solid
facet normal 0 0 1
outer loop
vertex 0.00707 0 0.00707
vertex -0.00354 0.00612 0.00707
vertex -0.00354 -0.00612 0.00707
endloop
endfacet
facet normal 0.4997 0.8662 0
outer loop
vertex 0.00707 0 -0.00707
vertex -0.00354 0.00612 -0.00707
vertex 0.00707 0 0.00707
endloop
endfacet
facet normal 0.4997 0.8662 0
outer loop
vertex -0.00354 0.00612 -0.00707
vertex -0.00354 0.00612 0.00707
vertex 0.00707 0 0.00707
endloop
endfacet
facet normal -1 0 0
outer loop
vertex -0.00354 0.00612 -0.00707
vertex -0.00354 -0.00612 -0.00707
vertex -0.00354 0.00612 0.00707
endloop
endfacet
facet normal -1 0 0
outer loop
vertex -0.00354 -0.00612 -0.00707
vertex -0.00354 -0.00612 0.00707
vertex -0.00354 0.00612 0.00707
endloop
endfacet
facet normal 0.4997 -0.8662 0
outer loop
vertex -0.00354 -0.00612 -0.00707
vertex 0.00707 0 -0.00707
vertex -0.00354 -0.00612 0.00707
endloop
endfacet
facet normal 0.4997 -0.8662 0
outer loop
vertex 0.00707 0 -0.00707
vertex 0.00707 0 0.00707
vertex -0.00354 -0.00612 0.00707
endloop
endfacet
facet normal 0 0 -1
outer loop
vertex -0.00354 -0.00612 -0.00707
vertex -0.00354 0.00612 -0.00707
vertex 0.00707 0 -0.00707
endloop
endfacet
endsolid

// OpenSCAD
include <params.scad>
assert(body_l > 0 && body_w > 0, "positive plate dims");
assert(ext_left <= clear_left, "left extent within door clearance");
assert(ext_down <= clear_down, "down extent within handle clearance");
assert(knob_w_top <= knob_w_base, "knob tapers base->top");
assert(knob_engage < knob_h, "engagement shallower than protrusion");
// 基板レイアウト
assert(pcb_off_y - pcb_w/2 >= ped_curb_ro + 1, "基板 -Y 端が受けカーブに近すぎる");
assert(abs(pcb_top_z - (wall + tray_t + pcb_standoff_h + pcb_t)) < 1e-6,
       "基板上面の Z が積み上げと一致");
echo("params_test ok");
sphere(0.01, $fn = 3);
